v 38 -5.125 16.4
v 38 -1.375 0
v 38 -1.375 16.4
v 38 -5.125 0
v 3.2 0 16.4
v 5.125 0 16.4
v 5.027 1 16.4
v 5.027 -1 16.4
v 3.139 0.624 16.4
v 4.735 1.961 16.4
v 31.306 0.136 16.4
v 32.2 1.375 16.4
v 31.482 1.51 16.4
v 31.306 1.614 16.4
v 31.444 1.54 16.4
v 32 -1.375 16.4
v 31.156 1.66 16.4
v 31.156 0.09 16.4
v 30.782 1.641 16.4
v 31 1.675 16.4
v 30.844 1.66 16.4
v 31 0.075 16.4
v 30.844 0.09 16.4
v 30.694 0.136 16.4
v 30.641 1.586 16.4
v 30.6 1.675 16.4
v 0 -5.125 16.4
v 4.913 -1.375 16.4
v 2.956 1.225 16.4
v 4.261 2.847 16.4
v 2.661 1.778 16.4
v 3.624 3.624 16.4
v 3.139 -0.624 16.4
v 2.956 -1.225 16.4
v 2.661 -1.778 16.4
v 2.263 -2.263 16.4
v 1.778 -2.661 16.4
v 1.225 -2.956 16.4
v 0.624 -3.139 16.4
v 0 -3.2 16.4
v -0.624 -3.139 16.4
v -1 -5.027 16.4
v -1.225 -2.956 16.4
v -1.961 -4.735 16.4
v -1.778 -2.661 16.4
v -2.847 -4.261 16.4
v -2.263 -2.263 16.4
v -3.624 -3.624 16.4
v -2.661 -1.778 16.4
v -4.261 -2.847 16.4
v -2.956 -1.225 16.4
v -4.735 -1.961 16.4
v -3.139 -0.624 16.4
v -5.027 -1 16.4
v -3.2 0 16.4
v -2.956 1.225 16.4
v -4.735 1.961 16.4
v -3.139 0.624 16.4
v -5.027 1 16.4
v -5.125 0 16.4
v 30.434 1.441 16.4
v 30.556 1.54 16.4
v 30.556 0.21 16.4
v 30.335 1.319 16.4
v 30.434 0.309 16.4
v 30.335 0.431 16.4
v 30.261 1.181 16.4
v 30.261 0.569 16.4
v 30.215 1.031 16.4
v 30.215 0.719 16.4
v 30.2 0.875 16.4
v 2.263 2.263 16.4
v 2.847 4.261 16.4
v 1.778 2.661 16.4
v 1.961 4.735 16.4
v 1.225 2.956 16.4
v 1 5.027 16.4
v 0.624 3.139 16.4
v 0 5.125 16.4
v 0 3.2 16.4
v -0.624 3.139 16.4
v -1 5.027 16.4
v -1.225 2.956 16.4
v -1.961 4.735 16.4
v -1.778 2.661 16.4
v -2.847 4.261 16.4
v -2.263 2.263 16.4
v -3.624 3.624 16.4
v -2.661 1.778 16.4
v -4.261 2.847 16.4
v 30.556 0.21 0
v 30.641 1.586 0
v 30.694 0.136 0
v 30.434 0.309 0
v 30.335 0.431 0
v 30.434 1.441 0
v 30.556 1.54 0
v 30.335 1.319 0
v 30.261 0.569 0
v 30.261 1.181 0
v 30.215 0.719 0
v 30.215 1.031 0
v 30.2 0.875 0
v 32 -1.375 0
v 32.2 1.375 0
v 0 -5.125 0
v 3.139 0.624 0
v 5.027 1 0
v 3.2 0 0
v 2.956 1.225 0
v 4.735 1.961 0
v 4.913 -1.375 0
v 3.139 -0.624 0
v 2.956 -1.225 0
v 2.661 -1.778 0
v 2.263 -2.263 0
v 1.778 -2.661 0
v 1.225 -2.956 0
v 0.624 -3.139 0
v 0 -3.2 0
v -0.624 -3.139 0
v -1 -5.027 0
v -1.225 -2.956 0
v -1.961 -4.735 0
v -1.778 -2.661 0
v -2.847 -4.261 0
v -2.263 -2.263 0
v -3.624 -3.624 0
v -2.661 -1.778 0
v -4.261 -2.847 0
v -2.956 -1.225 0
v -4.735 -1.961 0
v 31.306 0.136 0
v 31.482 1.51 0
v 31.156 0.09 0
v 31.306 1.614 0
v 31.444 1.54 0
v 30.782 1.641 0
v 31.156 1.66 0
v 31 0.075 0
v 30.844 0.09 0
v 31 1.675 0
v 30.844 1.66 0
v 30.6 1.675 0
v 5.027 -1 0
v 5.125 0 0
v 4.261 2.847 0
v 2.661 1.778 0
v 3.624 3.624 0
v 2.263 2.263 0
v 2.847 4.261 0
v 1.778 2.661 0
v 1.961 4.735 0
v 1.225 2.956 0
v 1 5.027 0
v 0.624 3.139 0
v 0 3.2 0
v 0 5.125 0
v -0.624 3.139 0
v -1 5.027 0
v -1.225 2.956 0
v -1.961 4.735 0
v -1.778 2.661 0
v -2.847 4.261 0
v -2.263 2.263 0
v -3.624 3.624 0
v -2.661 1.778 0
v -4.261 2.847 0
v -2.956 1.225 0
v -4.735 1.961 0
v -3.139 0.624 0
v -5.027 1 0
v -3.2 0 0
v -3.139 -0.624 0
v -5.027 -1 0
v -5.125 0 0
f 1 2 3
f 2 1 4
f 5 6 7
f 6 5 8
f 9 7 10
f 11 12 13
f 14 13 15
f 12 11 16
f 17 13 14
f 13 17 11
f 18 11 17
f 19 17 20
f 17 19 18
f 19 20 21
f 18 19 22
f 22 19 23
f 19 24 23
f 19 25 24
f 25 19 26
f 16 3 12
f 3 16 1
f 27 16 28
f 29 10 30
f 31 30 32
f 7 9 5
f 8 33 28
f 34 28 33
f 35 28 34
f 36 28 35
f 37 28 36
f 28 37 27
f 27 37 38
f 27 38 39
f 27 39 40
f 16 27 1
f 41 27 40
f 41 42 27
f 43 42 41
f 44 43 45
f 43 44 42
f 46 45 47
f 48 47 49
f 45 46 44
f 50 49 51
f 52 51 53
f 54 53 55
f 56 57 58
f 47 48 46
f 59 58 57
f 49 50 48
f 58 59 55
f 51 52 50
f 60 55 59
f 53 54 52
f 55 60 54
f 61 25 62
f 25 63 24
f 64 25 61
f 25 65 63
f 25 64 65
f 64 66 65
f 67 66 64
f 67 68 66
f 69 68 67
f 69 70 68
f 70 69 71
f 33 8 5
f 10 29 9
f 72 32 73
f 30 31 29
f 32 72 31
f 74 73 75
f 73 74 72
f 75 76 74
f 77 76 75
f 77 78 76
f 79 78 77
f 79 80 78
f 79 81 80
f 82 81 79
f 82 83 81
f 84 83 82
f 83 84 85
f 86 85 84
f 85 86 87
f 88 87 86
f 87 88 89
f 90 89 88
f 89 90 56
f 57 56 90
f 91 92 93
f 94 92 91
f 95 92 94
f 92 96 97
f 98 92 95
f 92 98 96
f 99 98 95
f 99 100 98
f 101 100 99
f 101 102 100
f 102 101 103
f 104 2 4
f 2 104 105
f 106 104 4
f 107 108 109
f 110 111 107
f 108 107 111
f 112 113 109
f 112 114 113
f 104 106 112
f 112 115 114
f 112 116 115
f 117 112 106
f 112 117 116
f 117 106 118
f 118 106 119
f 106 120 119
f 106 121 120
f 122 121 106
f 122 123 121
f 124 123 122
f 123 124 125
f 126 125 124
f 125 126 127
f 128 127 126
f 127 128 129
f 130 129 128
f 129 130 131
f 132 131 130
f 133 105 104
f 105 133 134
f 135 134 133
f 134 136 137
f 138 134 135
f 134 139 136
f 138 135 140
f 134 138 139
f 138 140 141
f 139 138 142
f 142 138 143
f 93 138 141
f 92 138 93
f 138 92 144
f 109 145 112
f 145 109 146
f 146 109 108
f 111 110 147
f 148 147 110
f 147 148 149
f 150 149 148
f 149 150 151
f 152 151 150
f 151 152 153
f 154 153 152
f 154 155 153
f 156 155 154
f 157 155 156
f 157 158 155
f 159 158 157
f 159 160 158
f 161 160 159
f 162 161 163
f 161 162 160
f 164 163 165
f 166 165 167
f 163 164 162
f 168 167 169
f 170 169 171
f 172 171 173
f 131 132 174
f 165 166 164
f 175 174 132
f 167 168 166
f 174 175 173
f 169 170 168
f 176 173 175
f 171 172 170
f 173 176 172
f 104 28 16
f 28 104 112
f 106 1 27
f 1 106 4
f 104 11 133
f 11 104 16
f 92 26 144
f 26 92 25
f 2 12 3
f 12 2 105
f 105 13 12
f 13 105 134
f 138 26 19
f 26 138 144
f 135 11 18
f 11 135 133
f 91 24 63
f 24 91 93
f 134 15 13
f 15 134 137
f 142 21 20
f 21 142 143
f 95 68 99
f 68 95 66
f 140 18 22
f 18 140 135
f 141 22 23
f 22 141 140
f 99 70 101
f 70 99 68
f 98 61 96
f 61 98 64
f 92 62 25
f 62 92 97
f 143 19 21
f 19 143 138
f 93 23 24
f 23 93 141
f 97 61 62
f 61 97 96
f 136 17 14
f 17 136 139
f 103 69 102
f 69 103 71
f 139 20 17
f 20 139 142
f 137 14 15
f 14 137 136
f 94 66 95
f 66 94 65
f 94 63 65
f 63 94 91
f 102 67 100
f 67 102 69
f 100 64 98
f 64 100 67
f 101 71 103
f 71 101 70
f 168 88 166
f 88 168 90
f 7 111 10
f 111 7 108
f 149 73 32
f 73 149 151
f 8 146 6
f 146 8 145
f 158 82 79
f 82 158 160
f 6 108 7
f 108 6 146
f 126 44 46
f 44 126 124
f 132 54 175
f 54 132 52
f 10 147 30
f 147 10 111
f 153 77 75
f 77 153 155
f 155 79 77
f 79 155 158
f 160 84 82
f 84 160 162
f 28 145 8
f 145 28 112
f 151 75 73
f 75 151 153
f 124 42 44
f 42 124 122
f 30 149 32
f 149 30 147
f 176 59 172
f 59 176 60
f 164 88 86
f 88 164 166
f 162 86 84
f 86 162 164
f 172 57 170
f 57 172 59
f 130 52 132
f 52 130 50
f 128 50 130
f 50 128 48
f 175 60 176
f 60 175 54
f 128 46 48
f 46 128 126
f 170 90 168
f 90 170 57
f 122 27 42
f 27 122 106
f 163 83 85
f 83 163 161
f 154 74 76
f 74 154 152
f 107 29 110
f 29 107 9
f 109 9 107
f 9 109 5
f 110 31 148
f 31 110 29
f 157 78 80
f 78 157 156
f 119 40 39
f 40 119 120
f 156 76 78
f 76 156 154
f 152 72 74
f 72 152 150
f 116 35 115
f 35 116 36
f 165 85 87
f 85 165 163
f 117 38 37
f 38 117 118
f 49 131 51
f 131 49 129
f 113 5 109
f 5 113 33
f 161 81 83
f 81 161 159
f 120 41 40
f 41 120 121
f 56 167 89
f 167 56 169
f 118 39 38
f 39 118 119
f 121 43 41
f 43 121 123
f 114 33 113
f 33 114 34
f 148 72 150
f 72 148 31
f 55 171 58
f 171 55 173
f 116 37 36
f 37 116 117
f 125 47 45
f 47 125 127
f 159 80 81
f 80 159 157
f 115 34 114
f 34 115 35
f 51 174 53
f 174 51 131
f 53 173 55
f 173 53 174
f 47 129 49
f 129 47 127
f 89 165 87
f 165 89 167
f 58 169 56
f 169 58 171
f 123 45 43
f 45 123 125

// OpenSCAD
module A_PinTube() {
  cylinder(r=10.25/2, h=16.4,$fn=32);
}

module B_Plate() {
  union(){
    cube([38,3.75,16.4]);
    translate([0,3.75,0])
    linear_extrude(height=16.4){
      polygon([
        [32,0],
        [38,0],
        [32.2,2.75],
        [30.6,3.05]
      ]);
    }

    translate([31,6,0])
    cylinder(r=1.6/2, h=16.4,$fn=32);
  }
}

module C_PinHole(){
  translate([0,0,-1])
    cylinder(r=6.4/2, h=18,$fn=32);
}

module Z_Main() {
  difference(){  
    union(){
    A_PinTube();
    translate([0,-10.25/2,0])
      B_Plate();
    }
    
    C_PinHole();
  }
}

Z_Main();
